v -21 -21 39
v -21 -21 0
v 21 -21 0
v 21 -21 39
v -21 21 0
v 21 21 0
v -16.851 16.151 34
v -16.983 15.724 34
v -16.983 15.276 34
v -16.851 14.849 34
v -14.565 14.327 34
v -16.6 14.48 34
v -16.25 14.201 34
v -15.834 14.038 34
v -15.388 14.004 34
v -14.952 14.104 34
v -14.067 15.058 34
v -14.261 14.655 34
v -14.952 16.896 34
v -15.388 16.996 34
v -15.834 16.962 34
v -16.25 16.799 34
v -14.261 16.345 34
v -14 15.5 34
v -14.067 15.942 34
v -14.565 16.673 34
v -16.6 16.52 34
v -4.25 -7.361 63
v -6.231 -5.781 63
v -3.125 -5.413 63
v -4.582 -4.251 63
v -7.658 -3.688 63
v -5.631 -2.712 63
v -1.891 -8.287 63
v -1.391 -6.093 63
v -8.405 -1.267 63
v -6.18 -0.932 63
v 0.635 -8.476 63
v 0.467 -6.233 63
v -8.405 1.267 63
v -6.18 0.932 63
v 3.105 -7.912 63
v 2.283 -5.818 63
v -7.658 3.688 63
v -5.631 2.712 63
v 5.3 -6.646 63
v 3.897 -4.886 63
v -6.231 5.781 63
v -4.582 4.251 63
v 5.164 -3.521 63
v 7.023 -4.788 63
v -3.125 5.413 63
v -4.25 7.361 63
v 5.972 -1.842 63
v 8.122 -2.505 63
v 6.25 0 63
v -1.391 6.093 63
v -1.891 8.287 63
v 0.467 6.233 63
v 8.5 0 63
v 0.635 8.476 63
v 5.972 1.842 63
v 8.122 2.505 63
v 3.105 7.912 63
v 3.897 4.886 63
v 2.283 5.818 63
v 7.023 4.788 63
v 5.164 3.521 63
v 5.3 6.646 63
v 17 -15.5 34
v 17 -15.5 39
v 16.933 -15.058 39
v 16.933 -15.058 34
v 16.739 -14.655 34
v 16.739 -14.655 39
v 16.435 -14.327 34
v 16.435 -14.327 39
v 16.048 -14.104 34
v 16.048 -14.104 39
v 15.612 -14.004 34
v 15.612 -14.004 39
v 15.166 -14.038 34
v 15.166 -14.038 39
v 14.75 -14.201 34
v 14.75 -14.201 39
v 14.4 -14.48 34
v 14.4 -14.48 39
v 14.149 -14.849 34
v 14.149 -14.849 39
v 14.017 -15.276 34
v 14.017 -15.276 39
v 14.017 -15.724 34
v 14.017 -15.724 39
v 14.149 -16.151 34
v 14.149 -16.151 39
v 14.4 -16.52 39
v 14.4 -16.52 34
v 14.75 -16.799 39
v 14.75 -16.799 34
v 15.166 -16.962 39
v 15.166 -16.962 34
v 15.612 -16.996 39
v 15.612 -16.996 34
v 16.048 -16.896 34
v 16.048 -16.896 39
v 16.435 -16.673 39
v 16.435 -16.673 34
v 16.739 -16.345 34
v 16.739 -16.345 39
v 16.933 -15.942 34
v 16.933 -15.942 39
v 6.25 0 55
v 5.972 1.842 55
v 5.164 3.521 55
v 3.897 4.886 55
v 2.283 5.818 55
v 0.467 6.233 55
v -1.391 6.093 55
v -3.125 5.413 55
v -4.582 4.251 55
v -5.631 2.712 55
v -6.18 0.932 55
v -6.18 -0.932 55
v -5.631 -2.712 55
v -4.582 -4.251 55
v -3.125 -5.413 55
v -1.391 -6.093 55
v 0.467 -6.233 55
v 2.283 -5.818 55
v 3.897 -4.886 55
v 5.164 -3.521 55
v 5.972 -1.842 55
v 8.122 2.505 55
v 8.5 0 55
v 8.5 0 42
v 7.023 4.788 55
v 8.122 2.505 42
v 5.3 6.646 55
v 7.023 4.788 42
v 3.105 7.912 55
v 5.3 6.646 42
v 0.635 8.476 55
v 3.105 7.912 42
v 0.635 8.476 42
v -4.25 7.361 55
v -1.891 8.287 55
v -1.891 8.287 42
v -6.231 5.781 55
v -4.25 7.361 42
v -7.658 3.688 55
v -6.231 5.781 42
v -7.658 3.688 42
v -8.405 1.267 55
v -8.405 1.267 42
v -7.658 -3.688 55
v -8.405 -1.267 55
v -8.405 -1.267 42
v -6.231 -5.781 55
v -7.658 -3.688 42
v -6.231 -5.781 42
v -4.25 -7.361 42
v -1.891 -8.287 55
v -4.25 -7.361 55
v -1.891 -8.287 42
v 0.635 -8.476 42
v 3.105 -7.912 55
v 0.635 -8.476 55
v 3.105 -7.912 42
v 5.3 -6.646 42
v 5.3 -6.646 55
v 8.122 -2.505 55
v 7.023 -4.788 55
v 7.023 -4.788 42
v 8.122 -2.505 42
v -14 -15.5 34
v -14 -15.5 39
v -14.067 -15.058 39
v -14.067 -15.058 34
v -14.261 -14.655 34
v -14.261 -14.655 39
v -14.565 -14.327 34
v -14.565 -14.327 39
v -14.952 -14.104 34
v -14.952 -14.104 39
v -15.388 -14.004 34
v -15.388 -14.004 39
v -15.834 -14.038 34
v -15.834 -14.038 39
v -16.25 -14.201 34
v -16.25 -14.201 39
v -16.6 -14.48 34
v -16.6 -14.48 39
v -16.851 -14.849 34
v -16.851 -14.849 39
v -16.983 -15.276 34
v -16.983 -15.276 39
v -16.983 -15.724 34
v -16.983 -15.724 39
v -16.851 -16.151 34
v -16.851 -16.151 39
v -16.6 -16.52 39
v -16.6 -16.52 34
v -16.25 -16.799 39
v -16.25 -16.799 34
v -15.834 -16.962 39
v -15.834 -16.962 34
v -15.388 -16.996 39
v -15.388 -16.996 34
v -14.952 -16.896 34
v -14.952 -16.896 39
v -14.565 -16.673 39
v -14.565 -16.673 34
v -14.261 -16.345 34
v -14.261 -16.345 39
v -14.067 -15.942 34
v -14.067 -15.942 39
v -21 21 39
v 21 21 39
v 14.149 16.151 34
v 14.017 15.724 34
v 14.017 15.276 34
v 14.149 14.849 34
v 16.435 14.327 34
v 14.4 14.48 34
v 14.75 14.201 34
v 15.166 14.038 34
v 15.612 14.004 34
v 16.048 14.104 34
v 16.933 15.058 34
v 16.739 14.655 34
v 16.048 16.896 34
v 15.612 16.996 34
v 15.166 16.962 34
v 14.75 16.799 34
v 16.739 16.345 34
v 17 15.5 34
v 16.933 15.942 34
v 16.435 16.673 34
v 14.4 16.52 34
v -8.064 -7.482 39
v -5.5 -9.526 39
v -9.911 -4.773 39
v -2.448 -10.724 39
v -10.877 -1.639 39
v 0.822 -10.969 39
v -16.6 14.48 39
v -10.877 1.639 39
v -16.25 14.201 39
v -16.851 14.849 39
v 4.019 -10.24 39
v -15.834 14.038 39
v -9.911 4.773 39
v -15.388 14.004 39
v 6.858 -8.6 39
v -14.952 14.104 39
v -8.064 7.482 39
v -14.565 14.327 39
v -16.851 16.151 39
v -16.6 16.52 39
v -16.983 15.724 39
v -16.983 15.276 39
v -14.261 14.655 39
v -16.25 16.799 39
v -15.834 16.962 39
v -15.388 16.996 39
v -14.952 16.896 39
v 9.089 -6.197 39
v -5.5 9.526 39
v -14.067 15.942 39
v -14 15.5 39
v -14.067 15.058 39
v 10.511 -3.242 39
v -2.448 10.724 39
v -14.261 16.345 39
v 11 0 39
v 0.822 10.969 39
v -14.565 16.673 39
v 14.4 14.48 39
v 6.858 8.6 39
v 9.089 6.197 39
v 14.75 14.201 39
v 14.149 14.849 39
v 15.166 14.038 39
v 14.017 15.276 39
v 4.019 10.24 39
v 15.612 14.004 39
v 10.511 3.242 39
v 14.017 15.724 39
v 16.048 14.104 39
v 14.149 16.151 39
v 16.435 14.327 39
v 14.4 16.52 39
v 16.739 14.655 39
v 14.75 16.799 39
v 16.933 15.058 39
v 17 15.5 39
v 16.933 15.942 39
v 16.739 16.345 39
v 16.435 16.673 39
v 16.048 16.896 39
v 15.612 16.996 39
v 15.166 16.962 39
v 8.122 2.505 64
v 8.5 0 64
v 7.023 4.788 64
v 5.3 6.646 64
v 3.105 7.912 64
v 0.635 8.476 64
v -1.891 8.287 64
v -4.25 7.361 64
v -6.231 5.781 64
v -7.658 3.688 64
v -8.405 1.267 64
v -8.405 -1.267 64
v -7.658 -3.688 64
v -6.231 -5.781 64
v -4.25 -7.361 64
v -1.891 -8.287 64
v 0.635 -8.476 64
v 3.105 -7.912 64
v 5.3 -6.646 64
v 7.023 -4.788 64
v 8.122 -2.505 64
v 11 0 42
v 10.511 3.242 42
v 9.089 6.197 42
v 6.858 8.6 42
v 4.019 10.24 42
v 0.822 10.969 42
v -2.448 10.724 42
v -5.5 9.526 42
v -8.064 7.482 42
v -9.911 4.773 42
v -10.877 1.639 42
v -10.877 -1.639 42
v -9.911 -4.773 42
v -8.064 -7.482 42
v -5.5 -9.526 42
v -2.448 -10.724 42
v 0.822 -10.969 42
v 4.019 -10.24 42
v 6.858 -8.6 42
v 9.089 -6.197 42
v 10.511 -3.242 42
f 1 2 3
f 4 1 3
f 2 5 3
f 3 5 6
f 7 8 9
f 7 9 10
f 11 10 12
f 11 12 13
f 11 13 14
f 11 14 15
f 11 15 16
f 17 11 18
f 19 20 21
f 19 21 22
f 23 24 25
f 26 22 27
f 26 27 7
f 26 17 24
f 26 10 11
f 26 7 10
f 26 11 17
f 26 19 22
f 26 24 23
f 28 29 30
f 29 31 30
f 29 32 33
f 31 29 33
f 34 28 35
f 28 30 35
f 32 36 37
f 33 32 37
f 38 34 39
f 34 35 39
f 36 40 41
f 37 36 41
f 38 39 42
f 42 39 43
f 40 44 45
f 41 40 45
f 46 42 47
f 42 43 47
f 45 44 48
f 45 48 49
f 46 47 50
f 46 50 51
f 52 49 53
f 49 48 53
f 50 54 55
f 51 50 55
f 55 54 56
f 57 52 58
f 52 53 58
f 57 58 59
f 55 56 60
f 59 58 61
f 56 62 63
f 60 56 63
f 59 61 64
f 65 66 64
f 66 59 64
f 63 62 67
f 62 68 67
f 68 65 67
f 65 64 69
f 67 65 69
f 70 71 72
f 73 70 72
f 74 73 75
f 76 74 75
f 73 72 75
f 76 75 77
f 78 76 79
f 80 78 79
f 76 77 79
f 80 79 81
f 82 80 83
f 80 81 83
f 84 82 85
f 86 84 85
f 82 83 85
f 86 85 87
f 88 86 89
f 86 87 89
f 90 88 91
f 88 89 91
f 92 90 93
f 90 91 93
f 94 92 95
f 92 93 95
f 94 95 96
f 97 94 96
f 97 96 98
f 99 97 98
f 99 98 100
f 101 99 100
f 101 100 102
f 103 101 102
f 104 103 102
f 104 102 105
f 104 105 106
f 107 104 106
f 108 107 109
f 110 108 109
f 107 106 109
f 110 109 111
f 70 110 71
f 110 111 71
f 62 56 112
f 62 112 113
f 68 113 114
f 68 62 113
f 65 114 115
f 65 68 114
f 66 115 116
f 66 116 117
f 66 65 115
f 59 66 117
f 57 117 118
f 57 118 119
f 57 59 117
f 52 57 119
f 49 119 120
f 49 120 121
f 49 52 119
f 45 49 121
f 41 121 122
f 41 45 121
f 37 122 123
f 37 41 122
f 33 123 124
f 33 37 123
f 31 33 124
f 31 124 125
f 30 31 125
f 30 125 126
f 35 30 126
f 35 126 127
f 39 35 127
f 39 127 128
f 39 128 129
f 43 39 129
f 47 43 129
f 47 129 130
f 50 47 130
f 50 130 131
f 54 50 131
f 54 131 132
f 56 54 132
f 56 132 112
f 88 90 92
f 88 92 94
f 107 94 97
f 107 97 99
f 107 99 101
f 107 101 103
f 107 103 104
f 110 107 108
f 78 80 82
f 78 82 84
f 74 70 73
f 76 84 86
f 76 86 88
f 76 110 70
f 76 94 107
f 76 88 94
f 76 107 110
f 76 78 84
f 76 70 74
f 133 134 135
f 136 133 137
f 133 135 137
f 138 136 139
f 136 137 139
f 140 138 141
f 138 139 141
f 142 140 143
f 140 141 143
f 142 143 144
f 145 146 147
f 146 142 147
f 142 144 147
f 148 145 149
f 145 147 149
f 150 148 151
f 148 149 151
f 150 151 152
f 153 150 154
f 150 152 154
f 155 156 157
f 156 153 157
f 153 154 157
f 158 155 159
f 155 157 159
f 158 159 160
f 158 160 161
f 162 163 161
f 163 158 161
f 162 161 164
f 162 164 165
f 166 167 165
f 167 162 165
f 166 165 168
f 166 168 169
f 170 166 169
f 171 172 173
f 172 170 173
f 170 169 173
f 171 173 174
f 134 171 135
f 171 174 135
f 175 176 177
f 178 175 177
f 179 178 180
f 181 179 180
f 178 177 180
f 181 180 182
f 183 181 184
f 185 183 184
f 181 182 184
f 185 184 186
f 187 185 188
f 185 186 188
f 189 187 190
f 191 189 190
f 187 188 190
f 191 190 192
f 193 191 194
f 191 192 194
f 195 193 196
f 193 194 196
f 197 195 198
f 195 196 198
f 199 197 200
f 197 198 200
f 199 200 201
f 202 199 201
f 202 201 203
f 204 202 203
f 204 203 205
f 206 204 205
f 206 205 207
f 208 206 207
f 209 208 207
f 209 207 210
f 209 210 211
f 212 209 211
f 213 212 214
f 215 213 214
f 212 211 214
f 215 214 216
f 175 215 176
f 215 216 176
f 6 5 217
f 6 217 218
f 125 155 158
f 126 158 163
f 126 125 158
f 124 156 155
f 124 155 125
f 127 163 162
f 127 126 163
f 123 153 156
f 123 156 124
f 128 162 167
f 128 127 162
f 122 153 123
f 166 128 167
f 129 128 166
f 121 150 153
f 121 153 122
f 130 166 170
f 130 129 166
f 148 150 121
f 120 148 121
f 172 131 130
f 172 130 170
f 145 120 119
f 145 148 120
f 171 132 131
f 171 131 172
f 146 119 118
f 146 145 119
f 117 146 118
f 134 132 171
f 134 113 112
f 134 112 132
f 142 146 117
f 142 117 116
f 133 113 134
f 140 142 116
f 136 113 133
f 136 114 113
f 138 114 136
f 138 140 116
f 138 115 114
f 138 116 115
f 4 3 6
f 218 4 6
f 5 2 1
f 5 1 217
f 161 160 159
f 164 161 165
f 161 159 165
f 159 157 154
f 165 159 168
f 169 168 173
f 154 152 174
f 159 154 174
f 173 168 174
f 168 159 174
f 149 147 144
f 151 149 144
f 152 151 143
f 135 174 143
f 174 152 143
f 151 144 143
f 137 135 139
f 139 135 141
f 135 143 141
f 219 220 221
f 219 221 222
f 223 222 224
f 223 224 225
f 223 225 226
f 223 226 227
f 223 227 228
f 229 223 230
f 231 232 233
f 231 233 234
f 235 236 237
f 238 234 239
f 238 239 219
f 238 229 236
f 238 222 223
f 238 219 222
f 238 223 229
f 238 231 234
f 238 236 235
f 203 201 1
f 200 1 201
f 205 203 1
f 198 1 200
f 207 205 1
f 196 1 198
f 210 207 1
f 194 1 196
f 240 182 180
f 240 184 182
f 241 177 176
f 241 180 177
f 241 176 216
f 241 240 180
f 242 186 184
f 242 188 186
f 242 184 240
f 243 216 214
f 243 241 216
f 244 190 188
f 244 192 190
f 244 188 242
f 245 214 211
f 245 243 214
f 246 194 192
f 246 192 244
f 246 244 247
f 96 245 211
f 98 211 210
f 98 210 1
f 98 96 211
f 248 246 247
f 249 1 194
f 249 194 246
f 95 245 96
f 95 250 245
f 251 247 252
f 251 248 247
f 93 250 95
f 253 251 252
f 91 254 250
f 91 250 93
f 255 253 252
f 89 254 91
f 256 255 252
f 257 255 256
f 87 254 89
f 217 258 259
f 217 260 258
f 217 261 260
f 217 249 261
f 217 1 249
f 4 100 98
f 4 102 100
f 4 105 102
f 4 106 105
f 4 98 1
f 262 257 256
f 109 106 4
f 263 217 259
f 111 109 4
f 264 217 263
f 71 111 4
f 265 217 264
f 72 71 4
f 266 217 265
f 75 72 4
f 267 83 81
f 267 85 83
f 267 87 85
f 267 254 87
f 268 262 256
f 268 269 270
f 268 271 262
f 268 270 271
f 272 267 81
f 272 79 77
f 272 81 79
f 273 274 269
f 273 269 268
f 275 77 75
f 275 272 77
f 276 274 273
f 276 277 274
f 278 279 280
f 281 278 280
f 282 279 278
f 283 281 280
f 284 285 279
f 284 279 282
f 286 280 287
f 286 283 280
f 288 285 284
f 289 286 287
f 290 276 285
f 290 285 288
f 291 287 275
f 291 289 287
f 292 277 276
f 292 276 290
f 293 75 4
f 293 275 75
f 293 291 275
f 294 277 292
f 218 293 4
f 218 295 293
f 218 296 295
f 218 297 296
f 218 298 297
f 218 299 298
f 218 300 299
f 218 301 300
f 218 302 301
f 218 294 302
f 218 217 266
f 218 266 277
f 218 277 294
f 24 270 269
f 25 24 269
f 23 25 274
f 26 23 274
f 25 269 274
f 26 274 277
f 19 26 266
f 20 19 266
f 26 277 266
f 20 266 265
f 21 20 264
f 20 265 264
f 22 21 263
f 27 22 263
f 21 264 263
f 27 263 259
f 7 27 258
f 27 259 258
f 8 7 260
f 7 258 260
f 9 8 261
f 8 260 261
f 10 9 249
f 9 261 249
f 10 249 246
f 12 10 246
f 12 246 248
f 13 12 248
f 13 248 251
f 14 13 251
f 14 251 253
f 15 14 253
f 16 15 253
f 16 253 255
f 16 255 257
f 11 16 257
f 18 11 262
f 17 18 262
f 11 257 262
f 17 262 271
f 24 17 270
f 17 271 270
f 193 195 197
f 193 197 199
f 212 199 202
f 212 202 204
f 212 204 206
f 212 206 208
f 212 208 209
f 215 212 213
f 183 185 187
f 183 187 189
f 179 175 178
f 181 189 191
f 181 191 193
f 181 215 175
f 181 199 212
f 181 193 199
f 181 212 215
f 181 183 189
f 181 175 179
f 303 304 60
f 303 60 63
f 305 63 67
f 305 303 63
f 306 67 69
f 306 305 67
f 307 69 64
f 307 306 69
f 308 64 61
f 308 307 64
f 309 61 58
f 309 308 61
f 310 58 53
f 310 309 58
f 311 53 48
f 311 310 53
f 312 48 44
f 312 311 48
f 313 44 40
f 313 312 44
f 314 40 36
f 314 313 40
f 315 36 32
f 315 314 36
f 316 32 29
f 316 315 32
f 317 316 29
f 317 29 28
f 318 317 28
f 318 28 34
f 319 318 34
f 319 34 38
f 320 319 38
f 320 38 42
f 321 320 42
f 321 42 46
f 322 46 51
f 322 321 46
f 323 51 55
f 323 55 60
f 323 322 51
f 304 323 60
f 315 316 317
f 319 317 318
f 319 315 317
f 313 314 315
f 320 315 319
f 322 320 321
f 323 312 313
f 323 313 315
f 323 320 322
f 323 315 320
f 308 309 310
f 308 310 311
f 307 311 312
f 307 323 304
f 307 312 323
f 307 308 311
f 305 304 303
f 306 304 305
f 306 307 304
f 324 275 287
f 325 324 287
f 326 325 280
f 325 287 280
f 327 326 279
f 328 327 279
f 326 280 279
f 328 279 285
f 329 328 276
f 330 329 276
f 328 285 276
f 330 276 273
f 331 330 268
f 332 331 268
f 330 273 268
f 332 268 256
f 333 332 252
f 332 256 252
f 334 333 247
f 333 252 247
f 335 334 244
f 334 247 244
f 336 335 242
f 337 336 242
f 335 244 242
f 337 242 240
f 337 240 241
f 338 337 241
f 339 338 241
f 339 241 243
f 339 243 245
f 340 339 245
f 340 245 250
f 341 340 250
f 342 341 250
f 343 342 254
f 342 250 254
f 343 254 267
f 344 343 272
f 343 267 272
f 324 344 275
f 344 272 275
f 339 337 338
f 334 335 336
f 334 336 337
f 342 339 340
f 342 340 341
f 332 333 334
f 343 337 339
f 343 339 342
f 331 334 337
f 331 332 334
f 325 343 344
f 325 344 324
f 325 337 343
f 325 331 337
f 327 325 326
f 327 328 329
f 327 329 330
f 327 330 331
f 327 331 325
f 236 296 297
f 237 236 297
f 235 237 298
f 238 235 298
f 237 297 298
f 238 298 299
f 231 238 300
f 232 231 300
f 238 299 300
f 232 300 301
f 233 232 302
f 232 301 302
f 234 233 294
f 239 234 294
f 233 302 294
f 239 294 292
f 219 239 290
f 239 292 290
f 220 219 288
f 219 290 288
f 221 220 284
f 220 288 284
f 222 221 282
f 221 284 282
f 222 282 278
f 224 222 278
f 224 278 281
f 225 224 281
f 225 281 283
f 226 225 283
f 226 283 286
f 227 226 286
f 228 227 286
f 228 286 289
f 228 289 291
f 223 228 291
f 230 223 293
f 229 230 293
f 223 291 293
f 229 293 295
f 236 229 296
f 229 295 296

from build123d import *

# Parameters (mm, degrees)
F0_W      = 42
F0_H      = 42
F1_DEPTH  = 39
F2_R      = 11
F3_DEPTH  = 3
F4_R      = 1.5
F5_DEPTH  = 5
F6_R      = 8.5
F7_DEPTH  = 22
F8_R      = 31.175954
F8_R_2    = 6.25
F9_DEPTH  = 9
F10_R     = 8.5
F11_DEPTH = 1


with BuildPart() as f1:
    # F0 (on Top) → F1 (new body)
    with BuildSketch(Plane.XY):
        Rectangle(F0_W, F0_H)
    extrude(amount=F1_DEPTH)

    # F2 (on face) → F3 (join)
    with BuildSketch(Plane.XY.offset(39)):
        Circle(F2_R)
    extrude(amount=F3_DEPTH)

    # F4 (on face) → F5 (cut)
    with BuildSketch(Plane.XY.offset(39)):
        with Locations((-15.5, 15.5)):
            Circle(F4_R)
        with Locations((15.5, 15.5)):
            Circle(F4_R)
        with Locations((15.5, -15.5)):
            Circle(F4_R)
        with Locations((-15.5, -15.5)):
            Circle(F4_R)
    extrude(amount=-F5_DEPTH, mode=Mode.SUBTRACT)


with BuildPart() as f7:
    # F6 (on face) → F7 (new body)
    with BuildSketch(Plane.XY.offset(42)):
        Circle(F6_R)
    extrude(amount=F7_DEPTH)

    # F8 (on face) → F9 (cut)
    with BuildSketch(Plane.XY.offset(64)):
        Circle(F8_R)
        Circle(F8_R_2, mode=Mode.SUBTRACT)
    extrude(amount=-F9_DEPTH, mode=Mode.SUBTRACT)

    # F10 (on face) → F11 (join)
    with BuildSketch(Plane.XY.offset(64)):
        Circle(F10_R)
    extrude(amount=-F11_DEPTH)


solid = Compound([f1.part, f7.part])
